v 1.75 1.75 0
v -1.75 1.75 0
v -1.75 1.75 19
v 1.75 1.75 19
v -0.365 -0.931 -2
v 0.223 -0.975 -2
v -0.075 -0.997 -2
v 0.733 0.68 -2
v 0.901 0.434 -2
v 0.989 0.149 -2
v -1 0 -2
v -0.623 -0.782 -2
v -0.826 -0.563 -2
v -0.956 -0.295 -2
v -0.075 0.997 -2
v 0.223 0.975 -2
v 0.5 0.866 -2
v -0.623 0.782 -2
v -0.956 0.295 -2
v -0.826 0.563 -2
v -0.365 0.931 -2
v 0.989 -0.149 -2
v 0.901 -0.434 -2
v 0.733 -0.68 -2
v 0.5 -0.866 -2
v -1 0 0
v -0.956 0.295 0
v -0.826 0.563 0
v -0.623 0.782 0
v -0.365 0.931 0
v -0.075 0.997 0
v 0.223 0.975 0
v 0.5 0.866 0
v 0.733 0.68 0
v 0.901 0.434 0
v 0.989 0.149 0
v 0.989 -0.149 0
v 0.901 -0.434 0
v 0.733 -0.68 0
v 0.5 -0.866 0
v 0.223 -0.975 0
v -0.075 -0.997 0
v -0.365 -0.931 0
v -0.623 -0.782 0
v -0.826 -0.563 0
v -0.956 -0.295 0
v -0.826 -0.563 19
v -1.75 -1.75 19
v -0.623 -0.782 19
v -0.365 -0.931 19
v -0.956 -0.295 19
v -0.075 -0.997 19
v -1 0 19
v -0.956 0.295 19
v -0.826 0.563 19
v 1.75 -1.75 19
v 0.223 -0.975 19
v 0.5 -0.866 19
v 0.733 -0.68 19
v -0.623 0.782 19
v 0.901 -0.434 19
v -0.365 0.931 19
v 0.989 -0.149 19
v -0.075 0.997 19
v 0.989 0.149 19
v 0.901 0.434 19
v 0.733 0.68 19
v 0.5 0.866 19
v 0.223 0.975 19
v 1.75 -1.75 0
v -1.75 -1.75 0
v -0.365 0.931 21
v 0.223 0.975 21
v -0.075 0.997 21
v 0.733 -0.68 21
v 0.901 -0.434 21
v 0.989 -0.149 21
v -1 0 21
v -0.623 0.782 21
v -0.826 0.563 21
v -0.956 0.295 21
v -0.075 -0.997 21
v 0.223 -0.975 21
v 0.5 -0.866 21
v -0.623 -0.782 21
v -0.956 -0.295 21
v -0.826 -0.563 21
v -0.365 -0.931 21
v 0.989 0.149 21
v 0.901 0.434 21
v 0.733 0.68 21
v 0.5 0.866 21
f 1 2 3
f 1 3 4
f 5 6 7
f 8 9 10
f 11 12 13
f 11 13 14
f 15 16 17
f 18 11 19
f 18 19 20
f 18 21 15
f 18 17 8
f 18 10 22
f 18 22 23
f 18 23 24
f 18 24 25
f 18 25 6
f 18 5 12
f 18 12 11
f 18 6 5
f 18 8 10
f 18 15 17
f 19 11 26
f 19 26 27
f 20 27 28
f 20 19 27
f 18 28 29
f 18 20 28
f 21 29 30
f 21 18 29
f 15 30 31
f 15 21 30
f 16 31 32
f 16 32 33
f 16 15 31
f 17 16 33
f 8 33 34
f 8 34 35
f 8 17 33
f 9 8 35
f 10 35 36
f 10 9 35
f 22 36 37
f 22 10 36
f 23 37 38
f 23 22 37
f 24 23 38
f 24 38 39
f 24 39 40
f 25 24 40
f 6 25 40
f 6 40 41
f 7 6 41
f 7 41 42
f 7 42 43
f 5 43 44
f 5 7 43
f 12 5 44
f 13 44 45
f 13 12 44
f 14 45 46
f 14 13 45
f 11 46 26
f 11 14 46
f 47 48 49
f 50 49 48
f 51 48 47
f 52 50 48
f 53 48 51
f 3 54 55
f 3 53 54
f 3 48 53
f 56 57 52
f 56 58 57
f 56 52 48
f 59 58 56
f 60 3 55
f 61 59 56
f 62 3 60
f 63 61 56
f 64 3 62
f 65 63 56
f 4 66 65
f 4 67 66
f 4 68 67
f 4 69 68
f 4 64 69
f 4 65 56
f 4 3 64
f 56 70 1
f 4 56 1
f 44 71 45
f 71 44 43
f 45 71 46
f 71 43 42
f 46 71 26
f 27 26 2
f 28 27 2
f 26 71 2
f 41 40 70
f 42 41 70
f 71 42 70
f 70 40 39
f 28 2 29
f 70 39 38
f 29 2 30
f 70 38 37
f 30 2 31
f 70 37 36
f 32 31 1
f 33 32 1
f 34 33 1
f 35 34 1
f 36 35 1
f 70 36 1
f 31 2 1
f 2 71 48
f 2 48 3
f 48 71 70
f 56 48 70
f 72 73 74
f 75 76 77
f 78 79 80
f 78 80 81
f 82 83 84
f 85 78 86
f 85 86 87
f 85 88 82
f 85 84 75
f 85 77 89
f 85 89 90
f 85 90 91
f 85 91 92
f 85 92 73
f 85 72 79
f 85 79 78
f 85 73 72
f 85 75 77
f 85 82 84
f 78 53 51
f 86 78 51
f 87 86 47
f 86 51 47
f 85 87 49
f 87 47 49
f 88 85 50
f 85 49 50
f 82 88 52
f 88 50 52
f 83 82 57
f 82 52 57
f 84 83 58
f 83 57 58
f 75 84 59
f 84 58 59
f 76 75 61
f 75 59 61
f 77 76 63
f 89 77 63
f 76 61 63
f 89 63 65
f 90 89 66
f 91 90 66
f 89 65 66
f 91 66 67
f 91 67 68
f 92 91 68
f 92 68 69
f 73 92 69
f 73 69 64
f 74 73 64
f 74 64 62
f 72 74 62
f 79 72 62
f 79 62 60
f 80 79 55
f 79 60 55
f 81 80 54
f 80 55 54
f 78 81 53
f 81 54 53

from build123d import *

# Parameters (mm, degrees)
CROQUIS1_W              = 3.5
CROQUIS1_H              = 3.5
SALIENTE_EXTRUIR1_DEPTH = 19
CROQUIS2_R              = 1
SALIENTE_EXTRUIR2_DEPTH = 2
SALIENTE_EXTRUIR3_START = 2
CROQUIS3_R              = 1
SALIENTE_EXTRUIR3_DEPTH = 2


with BuildPart() as part:
    # Croquis1 → Saliente-Extruir1 (new body)
    with BuildSketch(Plane.XY):
        Rectangle(CROQUIS1_W, CROQUIS1_H)
    extrude(amount=SALIENTE_EXTRUIR1_DEPTH)

    # Croquis2 → Saliente-Extruir2 (add)
    with BuildSketch(Plane.XY.offset(19)):
        with Locations(Location((0, 0, 0), (0, 0, 180))):
            Circle(CROQUIS2_R)
    extrude(amount=SALIENTE_EXTRUIR2_DEPTH)

    # Croquis3 → Saliente-Extruir3 (add)
    with BuildSketch(Plane(origin=(0, 0, 0), x_dir=(-1, 0, 0), z_dir=(0, 0, -1)).offset(SALIENTE_EXTRUIR3_START)):
        Circle(CROQUIS3_R)
    extrude(amount=-SALIENTE_EXTRUIR3_DEPTH)


solid = part.part
